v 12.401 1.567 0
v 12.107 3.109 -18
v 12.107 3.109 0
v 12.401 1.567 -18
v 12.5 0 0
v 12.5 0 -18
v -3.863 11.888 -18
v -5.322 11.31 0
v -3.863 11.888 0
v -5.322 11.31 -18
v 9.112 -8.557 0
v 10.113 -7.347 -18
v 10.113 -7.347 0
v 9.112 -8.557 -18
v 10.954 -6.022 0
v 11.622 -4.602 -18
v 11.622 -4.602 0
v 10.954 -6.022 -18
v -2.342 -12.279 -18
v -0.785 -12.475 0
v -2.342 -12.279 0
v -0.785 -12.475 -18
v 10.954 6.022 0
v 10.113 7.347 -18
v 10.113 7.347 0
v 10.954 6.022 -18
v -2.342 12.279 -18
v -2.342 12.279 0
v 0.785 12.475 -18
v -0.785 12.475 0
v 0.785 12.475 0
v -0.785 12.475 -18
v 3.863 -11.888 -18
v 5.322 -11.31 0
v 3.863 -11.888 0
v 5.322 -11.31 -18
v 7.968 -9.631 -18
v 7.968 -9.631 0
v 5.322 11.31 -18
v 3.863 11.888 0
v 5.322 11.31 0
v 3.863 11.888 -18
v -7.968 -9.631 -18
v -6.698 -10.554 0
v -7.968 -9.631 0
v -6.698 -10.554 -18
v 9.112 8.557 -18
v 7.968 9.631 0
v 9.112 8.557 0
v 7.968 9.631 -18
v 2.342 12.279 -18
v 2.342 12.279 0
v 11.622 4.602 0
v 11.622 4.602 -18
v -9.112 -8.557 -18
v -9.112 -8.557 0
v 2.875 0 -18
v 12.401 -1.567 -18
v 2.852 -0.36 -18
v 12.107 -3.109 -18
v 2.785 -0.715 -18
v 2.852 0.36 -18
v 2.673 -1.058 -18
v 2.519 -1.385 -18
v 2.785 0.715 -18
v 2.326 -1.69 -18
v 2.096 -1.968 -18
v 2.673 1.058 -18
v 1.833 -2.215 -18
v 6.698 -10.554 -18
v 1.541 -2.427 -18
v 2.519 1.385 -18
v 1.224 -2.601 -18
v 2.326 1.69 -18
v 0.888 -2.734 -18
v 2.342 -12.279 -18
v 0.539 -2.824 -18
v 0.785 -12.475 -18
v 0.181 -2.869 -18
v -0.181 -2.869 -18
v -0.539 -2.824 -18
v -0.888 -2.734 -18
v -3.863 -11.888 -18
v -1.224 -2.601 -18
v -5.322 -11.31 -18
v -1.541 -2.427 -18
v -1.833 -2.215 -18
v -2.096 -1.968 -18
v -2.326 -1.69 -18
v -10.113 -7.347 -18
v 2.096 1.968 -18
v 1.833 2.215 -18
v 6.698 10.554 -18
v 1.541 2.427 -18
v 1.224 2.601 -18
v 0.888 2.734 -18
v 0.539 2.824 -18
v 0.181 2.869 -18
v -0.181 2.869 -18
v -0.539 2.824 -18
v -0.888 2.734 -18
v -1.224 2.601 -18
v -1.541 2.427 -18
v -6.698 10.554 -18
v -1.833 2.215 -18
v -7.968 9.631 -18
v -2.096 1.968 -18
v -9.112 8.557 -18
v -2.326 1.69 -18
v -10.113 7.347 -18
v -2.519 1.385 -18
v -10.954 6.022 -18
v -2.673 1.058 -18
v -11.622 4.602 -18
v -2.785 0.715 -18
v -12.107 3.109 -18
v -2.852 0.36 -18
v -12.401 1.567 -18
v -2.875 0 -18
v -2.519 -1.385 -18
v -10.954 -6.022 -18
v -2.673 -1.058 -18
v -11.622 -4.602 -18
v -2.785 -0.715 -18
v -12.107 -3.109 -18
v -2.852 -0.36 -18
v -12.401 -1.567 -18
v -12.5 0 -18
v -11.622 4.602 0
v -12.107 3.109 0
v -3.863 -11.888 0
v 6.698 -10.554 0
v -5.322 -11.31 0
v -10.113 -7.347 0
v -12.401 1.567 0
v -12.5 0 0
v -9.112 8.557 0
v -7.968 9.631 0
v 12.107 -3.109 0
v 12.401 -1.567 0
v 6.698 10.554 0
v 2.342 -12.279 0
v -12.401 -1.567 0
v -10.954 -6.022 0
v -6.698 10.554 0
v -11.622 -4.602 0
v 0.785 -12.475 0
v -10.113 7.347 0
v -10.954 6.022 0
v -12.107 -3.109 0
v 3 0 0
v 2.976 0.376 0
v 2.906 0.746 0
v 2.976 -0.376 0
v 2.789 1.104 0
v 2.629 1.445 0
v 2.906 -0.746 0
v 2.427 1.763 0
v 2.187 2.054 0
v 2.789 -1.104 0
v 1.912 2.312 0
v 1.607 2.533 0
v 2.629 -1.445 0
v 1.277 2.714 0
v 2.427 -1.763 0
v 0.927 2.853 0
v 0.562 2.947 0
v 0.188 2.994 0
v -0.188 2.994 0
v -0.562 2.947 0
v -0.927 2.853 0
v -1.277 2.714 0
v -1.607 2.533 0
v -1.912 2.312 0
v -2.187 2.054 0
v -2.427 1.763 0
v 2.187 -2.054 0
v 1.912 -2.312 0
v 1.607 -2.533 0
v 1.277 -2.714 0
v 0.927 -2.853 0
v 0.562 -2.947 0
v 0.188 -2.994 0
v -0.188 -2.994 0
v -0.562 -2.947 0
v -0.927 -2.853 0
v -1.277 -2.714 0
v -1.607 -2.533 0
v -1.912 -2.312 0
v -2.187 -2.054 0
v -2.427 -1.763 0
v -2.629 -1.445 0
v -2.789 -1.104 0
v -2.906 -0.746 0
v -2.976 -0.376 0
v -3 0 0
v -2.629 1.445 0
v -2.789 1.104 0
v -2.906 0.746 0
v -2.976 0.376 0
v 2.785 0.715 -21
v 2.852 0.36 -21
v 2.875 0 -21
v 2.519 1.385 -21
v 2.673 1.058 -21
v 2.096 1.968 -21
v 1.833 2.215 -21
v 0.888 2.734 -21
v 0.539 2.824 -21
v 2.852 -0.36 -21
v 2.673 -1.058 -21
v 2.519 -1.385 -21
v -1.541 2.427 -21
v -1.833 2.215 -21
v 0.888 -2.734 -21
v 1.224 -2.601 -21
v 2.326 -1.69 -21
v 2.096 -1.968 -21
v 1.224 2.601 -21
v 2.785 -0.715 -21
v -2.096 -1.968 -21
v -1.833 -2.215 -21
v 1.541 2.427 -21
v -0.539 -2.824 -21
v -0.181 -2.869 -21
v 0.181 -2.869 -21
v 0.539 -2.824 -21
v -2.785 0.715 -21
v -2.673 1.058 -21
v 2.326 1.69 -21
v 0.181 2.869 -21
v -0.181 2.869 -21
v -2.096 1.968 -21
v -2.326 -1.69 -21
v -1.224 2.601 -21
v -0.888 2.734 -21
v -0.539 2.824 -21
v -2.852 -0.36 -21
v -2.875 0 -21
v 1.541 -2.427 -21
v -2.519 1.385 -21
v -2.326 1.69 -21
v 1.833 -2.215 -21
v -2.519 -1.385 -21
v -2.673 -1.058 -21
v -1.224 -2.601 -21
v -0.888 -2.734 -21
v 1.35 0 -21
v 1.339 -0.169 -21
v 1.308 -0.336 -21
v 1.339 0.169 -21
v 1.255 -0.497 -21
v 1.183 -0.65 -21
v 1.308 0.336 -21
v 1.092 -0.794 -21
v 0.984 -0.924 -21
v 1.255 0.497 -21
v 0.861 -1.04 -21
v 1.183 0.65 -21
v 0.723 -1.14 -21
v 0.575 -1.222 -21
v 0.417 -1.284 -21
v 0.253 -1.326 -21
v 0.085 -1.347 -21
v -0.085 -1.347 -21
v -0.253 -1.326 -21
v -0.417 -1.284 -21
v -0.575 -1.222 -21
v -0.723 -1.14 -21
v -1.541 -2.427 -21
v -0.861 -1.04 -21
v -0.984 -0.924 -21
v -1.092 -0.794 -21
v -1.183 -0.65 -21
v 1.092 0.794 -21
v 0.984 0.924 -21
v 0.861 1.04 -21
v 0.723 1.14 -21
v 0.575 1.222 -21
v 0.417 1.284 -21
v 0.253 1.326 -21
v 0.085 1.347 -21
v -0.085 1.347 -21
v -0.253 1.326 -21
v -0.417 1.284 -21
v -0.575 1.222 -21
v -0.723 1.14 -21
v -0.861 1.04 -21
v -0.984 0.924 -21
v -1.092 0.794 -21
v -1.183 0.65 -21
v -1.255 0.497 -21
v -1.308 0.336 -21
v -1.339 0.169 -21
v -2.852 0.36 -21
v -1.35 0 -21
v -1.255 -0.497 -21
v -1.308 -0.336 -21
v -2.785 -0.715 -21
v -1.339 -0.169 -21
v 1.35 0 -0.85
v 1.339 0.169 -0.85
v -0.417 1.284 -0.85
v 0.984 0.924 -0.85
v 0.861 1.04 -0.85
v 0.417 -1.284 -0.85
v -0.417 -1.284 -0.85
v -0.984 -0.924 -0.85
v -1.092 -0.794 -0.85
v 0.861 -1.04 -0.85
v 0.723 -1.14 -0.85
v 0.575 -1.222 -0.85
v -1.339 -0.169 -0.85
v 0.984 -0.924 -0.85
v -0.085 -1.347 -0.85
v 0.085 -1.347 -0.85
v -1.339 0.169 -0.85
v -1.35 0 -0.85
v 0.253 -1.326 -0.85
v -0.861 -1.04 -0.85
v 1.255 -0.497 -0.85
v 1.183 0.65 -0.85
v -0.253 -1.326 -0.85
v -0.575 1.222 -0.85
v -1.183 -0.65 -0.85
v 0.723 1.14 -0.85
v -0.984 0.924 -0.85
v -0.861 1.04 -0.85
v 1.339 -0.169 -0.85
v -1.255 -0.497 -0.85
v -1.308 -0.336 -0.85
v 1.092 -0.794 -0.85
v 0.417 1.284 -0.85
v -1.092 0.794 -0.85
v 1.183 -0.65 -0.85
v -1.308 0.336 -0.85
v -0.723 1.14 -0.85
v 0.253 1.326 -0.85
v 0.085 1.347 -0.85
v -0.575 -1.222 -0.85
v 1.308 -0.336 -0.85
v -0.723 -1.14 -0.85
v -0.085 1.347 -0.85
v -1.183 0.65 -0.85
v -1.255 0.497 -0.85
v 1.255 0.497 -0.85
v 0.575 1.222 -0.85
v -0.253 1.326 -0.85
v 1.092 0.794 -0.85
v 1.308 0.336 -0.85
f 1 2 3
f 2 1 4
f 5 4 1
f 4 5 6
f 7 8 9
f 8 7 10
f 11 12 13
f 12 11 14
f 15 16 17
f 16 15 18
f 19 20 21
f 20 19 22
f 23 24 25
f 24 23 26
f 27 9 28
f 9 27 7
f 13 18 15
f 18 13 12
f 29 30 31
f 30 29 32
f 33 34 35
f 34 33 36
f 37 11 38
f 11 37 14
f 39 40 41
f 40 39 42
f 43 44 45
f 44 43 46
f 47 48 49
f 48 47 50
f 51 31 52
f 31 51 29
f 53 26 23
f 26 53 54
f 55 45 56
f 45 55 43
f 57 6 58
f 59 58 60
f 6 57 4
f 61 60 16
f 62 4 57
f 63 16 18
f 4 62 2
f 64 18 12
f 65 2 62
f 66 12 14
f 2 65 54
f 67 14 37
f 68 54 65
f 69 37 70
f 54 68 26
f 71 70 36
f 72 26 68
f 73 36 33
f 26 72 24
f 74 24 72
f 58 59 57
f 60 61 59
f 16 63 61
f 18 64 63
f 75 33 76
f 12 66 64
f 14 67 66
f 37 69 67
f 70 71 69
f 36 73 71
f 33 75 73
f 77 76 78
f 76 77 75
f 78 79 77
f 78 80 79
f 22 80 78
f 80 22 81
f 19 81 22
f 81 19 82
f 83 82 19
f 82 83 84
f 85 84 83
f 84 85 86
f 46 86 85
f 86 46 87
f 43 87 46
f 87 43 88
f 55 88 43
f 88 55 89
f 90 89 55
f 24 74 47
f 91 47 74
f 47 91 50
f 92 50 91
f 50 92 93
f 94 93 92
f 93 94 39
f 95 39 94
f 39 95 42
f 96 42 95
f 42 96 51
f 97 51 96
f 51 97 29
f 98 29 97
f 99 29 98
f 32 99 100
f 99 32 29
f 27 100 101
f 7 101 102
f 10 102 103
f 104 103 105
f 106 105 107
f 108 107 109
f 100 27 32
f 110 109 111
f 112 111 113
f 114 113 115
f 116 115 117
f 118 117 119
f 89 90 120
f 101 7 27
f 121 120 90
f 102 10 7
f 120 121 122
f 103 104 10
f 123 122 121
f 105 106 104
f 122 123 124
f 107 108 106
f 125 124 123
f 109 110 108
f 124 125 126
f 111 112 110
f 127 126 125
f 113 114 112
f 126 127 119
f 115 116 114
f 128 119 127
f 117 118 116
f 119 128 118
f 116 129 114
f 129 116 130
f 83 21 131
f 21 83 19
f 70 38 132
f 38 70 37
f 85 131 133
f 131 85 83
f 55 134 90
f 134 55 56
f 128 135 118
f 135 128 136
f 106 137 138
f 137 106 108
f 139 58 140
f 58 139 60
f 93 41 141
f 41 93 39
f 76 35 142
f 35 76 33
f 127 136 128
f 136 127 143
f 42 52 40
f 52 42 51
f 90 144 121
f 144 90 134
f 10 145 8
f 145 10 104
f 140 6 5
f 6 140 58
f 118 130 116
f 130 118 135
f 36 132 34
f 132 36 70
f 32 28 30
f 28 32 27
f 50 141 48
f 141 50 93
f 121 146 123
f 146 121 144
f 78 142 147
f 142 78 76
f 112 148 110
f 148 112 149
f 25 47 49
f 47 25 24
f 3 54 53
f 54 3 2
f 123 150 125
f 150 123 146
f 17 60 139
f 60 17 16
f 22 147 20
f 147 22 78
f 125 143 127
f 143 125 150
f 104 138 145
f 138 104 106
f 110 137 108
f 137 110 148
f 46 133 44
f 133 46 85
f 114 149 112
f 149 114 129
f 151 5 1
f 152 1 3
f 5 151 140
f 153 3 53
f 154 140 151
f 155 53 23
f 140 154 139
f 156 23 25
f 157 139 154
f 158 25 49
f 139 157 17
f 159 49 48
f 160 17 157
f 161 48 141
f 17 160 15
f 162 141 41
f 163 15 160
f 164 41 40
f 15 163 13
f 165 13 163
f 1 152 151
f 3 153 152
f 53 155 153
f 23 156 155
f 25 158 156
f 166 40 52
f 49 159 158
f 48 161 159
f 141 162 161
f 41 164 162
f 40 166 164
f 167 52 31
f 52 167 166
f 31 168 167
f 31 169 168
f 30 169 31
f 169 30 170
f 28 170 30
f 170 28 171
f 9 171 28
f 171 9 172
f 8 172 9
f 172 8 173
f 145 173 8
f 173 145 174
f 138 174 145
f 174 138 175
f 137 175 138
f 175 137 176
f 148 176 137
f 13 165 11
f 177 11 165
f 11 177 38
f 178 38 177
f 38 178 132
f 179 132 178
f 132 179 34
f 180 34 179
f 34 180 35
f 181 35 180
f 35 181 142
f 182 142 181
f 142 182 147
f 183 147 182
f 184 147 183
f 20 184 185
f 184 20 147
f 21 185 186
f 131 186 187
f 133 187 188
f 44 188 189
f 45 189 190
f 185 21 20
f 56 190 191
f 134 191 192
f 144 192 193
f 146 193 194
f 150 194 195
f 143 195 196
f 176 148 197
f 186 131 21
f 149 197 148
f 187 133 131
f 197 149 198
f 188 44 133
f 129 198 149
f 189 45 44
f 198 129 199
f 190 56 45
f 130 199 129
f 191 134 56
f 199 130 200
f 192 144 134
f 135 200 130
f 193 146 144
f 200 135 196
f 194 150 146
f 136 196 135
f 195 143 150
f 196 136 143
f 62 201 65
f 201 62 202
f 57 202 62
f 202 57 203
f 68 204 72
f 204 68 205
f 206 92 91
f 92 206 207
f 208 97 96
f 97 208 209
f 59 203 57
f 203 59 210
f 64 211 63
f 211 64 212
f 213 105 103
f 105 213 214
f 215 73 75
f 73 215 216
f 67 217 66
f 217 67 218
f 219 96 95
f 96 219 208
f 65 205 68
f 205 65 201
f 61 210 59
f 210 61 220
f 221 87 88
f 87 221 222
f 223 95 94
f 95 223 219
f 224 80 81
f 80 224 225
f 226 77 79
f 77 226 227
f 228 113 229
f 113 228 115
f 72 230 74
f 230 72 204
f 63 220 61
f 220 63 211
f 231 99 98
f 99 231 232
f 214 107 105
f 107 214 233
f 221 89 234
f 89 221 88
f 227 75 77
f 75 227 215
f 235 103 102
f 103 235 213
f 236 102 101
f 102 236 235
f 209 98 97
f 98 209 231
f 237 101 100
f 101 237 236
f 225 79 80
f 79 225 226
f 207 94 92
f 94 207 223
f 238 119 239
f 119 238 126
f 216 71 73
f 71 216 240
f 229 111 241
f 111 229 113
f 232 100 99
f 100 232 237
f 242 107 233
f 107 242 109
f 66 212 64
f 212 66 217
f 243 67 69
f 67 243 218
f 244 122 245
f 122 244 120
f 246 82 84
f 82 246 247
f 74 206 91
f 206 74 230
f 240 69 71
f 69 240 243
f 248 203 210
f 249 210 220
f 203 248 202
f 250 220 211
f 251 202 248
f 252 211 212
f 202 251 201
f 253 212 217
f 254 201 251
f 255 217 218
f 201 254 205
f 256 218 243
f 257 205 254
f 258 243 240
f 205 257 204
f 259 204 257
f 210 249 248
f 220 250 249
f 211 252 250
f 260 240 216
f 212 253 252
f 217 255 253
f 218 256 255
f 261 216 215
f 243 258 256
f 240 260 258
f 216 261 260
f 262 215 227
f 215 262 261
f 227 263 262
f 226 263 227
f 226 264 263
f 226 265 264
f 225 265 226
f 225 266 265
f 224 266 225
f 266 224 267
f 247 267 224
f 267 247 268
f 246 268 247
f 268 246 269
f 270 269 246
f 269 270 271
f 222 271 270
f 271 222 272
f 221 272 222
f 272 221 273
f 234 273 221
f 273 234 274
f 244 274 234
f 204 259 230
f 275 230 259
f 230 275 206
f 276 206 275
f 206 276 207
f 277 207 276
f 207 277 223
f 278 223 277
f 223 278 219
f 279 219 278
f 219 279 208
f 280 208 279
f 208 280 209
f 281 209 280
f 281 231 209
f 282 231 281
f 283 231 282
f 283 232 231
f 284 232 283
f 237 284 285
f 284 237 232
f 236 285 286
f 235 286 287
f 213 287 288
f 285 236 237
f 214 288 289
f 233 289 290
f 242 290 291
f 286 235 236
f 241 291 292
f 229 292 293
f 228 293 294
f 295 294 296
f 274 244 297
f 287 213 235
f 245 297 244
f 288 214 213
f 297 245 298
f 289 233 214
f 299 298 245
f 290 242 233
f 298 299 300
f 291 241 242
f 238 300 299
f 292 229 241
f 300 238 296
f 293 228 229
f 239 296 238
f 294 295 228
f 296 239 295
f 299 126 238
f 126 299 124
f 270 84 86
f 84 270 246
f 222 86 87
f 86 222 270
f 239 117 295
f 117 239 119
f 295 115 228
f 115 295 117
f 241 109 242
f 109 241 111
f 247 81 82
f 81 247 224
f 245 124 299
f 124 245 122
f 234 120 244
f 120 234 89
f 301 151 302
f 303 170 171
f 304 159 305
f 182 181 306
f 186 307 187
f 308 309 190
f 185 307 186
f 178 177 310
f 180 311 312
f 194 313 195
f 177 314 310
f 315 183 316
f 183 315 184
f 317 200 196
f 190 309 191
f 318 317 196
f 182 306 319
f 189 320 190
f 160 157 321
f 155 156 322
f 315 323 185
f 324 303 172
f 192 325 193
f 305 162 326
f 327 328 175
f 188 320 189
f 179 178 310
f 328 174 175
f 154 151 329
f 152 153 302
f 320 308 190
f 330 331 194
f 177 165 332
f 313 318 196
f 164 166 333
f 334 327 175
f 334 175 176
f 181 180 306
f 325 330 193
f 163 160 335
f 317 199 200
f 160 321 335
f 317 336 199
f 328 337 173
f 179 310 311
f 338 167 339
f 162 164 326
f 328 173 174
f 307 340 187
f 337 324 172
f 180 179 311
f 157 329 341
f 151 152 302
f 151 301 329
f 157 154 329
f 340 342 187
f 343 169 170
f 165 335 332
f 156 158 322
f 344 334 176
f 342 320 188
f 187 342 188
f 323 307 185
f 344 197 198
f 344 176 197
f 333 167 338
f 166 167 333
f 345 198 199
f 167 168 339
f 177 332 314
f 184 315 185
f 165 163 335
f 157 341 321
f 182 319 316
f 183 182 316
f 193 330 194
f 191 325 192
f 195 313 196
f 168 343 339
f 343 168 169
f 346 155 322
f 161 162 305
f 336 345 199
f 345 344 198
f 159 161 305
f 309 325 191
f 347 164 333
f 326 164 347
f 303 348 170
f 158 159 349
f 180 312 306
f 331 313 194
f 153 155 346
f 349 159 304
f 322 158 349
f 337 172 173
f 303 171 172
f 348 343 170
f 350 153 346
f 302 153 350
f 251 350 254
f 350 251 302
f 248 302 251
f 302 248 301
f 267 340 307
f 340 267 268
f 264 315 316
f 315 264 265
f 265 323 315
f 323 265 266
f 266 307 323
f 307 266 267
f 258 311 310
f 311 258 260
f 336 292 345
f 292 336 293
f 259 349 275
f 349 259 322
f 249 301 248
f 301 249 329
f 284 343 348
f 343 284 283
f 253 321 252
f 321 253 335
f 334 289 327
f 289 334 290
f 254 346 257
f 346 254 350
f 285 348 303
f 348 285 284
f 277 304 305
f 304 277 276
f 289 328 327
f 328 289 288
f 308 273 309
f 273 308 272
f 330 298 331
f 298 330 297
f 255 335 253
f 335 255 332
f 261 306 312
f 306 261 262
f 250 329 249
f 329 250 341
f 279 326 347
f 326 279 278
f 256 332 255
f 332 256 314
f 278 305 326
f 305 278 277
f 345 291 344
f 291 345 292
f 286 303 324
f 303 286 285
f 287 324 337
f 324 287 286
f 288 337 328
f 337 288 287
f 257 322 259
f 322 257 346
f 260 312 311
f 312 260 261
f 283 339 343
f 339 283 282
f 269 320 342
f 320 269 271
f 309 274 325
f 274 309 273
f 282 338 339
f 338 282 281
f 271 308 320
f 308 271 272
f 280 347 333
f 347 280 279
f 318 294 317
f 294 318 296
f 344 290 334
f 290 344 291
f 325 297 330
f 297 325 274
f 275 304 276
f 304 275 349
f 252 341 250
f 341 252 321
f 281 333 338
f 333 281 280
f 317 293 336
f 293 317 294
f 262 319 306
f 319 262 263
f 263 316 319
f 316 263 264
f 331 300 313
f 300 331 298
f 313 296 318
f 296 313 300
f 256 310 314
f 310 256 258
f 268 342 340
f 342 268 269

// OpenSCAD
$fn = 50;


difference() {
	union() {
		translate(v = [0, 0, -18.0000000000]) {
			cylinder(h = 18, r = 12.5000000000);
		}
		#translate(v = [0, 0, -21.0000000000]) {
			cylinder(h = 21, r = 2.8750000000);
		}
	}
	union() {
		translate(v = [0, 0, 0]) {
			rotate(a = [0, 0, 0]) {
				difference() {
					union() {
						translate(v = [0, 0, -21.0000000000]) {
							cylinder(h = 21, r = 1.0000000000);
						}
						translate(v = [0, 0, -0.8500000000]) {
							cylinder(h = 0.8500000000, r1 = 1.3500000000, r2 = 3.0000000000);
						}
						translate(v = [0, 0, -21.0000000000]) {
							cylinder(h = 21, r = 1.3500000000);
						}
						translate(v = [0, 0, -21.0000000000]) {
							cylinder(h = 21, r = 1.0000000000);
						}
					}
					union();
				}
			}
		}
	}
}
